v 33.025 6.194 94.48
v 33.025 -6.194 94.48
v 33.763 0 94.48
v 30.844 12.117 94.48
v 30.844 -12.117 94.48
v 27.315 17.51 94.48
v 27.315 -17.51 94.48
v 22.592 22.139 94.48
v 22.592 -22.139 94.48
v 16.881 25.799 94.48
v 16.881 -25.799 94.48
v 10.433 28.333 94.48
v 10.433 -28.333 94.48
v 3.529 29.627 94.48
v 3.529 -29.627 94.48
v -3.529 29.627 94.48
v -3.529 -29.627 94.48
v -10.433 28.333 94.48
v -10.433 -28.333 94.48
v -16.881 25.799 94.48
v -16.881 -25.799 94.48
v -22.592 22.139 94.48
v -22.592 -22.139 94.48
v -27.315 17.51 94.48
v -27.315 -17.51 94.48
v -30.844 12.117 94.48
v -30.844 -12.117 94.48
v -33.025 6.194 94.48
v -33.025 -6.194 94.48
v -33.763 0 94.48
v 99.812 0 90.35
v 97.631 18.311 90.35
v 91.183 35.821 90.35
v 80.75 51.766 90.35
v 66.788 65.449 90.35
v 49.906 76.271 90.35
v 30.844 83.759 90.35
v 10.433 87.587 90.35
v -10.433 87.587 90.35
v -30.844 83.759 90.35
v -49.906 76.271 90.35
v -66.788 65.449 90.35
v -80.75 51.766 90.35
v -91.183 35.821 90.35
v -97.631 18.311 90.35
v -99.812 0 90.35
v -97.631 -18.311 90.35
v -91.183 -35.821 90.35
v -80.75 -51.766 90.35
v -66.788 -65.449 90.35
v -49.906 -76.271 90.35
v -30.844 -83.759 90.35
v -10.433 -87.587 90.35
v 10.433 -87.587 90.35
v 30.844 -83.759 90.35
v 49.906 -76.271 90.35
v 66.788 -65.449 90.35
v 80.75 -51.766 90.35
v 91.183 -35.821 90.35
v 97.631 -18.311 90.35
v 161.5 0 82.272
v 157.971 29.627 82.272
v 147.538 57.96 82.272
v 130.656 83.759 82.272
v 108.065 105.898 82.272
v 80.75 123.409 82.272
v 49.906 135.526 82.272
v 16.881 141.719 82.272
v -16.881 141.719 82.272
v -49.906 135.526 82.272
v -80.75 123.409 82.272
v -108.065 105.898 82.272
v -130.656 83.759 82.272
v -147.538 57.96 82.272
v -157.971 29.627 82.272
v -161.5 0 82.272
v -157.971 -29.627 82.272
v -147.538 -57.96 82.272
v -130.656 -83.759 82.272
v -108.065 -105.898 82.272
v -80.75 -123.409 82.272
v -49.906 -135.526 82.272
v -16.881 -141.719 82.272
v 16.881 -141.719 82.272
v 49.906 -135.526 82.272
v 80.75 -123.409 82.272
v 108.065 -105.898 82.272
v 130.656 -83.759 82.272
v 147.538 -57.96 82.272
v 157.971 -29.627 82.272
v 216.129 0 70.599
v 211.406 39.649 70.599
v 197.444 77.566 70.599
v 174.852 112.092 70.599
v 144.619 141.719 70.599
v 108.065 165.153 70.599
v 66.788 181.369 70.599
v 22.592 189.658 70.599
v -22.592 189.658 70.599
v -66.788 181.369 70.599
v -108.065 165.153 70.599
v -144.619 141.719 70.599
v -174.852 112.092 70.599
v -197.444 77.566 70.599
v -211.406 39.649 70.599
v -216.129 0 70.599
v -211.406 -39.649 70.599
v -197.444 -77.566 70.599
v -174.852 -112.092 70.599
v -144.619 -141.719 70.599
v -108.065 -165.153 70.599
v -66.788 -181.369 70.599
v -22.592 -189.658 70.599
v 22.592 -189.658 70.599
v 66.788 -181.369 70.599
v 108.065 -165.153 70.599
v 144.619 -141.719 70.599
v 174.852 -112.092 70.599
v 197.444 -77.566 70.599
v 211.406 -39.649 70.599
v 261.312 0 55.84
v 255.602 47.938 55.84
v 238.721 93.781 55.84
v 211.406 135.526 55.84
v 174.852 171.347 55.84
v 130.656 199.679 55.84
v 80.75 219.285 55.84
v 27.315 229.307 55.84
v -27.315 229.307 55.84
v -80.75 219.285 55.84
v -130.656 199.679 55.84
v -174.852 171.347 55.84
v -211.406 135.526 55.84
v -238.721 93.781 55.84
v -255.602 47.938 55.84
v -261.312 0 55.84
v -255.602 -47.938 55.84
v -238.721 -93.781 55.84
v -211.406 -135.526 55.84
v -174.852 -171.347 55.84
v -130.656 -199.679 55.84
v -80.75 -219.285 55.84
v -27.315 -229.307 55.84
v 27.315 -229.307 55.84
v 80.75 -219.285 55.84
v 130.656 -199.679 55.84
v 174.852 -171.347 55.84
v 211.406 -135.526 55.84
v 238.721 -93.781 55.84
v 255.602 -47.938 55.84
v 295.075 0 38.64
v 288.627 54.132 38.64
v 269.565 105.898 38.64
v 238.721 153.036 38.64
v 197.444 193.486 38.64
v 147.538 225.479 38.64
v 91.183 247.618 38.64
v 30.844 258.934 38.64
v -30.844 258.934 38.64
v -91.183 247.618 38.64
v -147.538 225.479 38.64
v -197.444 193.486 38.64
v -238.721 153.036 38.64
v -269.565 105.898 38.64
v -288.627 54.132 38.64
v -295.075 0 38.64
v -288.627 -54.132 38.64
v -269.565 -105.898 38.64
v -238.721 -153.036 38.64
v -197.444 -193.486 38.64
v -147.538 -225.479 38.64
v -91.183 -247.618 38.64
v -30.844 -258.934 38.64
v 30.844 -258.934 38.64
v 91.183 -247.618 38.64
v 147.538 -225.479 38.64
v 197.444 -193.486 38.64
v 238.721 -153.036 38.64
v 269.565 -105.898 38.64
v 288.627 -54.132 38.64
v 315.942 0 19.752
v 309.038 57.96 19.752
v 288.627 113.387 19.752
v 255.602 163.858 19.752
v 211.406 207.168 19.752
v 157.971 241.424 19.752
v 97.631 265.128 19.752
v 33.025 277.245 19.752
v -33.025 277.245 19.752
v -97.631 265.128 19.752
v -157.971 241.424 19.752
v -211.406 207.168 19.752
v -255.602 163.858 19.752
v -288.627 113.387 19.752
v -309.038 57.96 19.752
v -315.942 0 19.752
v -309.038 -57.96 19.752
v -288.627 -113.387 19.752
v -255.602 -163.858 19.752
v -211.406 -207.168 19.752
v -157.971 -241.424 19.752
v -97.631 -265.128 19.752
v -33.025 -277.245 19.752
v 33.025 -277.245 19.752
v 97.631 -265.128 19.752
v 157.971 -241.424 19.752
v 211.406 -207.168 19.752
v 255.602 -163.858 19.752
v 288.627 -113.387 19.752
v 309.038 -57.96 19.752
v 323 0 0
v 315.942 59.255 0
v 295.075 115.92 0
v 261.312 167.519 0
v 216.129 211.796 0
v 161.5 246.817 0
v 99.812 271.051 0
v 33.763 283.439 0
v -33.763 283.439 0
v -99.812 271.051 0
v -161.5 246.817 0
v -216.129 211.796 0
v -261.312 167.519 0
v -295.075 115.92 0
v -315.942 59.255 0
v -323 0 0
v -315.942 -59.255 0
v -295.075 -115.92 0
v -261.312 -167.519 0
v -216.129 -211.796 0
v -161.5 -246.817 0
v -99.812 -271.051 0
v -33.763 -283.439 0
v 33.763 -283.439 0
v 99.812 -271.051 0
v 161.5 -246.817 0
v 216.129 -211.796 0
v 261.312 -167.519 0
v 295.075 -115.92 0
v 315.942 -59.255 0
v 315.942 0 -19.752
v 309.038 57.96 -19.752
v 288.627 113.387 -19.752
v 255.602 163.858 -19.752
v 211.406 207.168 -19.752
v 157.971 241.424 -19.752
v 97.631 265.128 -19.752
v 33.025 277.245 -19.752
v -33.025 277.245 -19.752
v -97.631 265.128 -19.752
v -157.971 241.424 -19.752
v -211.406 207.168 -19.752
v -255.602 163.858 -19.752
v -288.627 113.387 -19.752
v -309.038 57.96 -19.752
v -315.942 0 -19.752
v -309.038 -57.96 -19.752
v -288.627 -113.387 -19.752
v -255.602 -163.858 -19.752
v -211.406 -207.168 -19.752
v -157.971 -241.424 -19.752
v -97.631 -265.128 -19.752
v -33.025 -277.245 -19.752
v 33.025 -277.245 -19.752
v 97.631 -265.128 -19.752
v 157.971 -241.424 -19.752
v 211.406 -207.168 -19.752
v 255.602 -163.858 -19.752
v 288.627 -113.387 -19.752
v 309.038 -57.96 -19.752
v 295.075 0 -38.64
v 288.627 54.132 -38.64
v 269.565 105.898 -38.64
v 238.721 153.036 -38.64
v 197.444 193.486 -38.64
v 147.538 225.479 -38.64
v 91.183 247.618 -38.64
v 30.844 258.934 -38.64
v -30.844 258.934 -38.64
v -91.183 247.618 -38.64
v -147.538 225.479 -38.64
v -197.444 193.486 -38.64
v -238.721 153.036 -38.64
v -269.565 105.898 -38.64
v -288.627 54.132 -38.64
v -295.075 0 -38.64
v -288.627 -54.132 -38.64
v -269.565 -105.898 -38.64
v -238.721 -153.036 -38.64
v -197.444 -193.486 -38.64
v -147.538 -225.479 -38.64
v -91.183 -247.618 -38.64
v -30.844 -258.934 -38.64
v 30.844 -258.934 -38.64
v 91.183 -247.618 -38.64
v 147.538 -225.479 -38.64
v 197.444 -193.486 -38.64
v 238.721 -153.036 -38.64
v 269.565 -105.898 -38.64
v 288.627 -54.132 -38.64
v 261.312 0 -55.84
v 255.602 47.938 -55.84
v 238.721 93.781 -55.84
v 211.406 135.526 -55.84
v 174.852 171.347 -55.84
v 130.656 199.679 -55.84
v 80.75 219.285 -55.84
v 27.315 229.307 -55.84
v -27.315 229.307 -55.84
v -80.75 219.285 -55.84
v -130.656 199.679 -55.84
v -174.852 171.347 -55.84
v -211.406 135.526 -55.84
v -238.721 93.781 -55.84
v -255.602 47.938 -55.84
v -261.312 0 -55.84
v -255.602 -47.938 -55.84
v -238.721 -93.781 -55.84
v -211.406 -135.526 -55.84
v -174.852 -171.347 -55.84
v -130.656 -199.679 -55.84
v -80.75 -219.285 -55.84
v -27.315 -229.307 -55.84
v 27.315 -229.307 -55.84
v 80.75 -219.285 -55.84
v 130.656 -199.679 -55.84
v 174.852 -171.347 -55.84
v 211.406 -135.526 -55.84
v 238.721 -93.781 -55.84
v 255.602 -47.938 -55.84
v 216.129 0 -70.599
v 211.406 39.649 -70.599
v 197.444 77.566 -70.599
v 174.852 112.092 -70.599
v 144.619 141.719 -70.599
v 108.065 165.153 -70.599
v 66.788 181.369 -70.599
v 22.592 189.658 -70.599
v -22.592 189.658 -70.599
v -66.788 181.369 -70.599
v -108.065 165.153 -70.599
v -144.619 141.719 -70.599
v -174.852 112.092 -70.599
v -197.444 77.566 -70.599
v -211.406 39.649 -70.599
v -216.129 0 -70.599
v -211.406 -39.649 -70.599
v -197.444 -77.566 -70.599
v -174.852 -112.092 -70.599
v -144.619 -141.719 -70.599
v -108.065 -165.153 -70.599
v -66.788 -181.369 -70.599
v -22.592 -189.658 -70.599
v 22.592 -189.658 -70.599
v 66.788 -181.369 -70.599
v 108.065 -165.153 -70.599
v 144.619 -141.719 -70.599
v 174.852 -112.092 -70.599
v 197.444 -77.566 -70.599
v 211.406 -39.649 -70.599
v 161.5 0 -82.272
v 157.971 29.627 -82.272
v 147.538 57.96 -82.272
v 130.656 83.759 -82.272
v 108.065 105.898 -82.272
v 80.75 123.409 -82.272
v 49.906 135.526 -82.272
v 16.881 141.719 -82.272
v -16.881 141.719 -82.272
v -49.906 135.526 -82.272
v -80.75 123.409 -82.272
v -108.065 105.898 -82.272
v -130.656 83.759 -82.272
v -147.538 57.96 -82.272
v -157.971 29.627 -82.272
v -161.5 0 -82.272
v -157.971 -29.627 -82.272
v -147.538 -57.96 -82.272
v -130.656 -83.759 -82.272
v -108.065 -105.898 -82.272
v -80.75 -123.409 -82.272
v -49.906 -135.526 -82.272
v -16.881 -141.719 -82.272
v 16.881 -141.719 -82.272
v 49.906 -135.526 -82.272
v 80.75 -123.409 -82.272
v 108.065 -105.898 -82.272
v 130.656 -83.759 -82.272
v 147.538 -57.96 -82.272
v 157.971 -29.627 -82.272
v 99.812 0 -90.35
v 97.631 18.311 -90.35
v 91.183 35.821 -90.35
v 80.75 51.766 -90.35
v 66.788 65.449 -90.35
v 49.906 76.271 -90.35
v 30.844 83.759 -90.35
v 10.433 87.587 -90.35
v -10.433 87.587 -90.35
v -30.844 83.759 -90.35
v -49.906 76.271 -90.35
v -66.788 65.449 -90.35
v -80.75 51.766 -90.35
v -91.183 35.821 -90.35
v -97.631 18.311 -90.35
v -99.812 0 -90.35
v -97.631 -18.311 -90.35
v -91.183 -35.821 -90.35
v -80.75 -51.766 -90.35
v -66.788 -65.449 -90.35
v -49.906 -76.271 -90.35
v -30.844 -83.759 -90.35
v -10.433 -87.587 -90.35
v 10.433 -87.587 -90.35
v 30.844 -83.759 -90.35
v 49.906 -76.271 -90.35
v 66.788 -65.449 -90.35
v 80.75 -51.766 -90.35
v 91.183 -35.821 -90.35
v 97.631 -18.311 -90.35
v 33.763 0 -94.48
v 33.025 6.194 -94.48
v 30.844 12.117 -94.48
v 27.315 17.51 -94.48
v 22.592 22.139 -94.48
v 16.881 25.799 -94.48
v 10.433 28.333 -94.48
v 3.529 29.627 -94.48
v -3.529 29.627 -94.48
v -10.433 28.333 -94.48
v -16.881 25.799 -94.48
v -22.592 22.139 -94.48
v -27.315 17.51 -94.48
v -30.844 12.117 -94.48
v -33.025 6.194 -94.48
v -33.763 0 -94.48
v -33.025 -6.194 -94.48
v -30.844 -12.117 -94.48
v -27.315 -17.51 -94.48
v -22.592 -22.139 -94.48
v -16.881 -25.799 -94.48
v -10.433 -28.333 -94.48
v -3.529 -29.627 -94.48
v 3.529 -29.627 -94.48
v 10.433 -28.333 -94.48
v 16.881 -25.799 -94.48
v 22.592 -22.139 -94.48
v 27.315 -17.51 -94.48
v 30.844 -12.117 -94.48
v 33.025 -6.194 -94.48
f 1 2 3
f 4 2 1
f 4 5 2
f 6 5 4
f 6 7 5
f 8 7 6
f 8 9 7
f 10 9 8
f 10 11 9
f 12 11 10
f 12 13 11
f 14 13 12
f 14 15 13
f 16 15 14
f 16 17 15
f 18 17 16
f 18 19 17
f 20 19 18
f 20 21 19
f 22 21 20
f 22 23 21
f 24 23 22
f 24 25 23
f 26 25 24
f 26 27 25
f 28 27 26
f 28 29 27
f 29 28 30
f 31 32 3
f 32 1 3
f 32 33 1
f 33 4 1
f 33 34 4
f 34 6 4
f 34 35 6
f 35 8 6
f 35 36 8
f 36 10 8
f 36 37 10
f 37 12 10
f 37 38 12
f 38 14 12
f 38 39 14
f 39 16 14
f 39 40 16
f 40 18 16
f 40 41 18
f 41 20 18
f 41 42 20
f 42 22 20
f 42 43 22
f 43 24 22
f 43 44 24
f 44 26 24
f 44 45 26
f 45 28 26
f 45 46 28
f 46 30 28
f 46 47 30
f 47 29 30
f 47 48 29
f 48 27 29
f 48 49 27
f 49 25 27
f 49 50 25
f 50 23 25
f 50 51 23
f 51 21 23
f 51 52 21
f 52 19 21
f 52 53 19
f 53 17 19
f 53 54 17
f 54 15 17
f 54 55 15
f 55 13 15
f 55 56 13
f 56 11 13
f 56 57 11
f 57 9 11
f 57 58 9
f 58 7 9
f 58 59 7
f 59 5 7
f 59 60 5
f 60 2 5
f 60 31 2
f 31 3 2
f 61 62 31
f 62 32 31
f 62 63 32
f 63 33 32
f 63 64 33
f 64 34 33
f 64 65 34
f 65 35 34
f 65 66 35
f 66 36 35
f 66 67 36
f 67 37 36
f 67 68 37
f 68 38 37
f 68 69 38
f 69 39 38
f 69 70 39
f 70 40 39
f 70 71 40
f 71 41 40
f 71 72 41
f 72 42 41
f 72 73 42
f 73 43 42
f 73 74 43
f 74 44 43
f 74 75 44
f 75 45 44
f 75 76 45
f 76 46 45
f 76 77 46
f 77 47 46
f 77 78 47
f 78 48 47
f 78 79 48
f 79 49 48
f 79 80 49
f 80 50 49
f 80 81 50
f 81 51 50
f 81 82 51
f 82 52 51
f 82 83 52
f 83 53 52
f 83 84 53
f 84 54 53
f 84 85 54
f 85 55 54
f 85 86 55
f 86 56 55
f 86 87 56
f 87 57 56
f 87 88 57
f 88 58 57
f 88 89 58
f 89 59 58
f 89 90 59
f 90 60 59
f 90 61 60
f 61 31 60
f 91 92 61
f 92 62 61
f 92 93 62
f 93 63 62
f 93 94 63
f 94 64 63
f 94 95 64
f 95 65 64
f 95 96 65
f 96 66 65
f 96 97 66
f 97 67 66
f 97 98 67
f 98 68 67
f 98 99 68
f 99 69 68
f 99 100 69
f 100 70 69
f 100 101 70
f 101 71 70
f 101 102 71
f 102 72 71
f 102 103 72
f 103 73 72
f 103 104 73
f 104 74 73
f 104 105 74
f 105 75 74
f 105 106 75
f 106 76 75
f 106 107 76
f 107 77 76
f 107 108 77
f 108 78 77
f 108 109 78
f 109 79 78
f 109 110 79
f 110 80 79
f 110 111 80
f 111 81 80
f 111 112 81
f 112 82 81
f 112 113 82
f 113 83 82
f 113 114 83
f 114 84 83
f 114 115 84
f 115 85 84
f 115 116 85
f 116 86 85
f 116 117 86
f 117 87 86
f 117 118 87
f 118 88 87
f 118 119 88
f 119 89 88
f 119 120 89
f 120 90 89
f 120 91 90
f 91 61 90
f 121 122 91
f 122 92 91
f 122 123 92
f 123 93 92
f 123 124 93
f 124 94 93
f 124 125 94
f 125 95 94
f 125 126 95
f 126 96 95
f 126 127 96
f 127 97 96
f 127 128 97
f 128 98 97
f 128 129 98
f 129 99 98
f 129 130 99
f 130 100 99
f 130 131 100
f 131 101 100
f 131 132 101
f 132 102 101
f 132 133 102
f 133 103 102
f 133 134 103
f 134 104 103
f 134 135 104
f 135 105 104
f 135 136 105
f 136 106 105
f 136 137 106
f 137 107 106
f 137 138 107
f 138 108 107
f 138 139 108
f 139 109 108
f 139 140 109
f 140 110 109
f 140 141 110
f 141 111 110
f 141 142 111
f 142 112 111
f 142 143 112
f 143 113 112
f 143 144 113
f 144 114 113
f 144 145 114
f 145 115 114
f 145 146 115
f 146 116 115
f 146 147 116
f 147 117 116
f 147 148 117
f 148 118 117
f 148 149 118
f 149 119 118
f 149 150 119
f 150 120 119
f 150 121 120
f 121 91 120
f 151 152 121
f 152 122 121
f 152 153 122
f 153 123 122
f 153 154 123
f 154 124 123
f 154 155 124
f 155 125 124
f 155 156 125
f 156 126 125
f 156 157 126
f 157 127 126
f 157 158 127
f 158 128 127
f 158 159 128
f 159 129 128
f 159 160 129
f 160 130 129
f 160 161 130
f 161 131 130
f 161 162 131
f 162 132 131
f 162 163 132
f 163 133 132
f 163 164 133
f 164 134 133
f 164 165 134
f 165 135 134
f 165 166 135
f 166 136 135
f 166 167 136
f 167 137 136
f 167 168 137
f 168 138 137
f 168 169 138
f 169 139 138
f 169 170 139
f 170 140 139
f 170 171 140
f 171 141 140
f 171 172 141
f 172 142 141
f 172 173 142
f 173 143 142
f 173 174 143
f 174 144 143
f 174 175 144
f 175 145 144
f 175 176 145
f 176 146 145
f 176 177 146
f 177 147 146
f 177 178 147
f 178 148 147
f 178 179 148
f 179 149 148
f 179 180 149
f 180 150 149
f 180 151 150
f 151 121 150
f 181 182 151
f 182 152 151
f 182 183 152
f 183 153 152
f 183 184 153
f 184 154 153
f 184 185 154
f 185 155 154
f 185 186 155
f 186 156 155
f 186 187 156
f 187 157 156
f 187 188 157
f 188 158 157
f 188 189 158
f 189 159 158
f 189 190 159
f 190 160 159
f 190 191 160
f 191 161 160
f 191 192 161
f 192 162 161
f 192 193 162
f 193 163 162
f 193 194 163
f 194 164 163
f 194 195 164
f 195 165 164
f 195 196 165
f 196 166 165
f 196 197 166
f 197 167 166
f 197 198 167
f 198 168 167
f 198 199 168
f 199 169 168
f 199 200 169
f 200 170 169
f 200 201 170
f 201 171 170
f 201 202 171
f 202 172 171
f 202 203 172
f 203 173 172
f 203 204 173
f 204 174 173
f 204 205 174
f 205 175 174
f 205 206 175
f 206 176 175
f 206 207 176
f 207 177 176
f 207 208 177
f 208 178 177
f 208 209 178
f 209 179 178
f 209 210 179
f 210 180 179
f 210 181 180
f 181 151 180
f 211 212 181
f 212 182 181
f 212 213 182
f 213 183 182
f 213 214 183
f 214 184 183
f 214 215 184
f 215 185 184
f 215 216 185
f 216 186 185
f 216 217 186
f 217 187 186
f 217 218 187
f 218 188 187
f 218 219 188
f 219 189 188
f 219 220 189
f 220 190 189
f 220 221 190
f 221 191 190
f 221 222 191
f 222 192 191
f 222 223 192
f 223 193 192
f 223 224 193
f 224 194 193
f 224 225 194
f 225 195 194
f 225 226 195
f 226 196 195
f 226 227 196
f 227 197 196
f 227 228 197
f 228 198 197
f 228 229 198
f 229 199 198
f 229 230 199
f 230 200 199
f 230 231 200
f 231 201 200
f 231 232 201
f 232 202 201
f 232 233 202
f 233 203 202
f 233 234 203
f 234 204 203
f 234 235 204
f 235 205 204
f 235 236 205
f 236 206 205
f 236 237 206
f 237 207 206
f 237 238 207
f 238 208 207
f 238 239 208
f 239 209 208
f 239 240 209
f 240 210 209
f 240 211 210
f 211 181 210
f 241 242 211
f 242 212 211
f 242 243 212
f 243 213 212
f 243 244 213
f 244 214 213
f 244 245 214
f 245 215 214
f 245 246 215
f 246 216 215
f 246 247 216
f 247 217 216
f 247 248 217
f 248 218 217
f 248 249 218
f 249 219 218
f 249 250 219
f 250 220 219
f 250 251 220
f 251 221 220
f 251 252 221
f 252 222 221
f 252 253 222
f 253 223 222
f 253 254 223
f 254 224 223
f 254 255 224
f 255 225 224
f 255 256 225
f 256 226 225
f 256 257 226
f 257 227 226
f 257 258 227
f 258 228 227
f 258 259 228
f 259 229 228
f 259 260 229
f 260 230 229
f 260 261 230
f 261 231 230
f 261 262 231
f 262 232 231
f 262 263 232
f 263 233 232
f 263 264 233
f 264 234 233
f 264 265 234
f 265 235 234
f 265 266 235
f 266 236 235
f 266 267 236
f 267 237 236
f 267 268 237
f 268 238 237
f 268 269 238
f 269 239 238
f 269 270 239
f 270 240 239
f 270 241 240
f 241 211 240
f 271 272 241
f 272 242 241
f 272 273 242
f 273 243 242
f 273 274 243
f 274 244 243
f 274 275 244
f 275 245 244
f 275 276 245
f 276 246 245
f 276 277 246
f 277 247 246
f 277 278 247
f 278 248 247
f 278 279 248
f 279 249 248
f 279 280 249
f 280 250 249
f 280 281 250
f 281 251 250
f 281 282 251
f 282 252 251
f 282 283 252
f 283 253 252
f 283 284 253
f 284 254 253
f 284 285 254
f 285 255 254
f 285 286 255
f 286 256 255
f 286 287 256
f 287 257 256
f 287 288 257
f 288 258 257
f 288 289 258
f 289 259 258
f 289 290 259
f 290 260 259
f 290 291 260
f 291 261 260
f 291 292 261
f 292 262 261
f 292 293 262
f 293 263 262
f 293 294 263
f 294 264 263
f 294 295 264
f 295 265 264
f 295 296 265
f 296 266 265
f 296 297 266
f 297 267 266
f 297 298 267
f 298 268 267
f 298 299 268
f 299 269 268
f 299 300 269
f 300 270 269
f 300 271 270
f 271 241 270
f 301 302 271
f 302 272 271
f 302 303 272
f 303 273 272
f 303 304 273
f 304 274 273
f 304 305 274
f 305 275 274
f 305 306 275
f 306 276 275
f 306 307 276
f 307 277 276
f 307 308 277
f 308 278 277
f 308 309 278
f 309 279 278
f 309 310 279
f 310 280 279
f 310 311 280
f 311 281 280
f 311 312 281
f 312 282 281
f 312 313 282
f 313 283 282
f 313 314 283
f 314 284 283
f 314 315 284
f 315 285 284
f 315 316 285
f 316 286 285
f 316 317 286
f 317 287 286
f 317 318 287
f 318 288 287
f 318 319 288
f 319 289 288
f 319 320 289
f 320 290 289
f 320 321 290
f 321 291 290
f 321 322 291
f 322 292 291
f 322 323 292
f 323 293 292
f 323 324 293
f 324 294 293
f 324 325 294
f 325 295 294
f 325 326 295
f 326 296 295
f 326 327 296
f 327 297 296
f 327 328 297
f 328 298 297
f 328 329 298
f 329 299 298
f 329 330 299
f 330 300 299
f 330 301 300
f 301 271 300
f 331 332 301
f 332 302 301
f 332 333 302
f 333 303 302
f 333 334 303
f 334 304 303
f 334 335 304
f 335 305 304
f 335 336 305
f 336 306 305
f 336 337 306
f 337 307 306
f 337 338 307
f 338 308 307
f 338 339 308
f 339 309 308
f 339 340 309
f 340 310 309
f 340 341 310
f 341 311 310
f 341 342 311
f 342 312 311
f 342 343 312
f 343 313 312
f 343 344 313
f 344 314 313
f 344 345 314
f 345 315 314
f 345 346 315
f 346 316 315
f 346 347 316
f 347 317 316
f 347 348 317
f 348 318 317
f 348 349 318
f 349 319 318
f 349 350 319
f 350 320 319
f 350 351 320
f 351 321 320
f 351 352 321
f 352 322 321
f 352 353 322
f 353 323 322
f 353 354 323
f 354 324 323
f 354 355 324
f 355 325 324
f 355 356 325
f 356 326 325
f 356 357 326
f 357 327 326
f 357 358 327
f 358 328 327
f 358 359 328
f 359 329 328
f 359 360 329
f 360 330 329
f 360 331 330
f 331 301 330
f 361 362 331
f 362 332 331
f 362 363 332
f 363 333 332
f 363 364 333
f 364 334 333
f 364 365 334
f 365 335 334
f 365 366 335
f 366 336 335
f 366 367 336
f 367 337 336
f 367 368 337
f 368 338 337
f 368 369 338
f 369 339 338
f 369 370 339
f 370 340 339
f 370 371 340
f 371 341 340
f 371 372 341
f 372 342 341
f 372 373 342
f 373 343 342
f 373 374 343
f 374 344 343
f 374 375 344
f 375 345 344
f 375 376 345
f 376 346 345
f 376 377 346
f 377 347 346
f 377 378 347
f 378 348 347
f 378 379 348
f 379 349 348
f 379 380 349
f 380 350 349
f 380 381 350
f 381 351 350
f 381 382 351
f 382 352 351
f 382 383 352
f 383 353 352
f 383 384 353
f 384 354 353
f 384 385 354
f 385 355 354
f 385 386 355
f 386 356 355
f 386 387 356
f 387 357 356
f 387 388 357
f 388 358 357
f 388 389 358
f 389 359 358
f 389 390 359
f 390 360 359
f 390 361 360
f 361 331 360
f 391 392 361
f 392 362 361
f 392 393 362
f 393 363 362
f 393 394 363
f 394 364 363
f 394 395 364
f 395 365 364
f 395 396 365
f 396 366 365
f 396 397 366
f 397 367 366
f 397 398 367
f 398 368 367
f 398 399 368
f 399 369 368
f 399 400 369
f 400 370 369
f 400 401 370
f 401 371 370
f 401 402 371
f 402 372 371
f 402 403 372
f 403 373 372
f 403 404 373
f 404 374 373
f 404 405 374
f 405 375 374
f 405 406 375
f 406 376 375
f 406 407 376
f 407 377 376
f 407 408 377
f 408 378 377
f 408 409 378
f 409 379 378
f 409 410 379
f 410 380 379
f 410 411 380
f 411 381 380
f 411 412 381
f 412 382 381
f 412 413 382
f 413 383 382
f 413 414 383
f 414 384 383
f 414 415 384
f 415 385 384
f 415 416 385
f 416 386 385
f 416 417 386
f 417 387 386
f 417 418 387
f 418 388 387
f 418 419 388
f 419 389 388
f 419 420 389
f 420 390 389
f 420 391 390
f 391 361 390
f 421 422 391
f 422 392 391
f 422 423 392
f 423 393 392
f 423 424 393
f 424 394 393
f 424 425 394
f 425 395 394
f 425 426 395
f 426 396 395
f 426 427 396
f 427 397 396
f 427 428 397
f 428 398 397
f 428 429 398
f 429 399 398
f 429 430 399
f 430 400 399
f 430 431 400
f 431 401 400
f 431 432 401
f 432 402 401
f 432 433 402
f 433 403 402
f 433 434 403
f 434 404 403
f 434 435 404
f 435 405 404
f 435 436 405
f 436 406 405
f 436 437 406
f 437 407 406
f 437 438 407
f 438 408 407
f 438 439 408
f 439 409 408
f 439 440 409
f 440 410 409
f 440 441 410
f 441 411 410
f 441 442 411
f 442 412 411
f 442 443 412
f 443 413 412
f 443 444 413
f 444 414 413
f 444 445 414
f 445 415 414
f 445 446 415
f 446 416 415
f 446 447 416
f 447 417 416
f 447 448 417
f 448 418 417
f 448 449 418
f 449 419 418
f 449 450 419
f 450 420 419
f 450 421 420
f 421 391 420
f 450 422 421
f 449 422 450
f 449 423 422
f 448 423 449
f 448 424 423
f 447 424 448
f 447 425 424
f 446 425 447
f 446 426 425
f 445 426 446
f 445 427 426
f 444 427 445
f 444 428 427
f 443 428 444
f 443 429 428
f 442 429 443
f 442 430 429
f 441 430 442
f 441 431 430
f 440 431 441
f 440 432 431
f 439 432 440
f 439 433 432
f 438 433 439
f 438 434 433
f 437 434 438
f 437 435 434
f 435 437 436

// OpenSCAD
// Generated by SolidPython 1.0.1 on 2020-07-29 00:46:53


scale(v = [17, 15, 5]) {
	sphere(r = 19);
}
/***********************************************
*********      SolidPython code:      **********
************************************************
 
# import packages: SolidPython
from solid import *
from solid.utils import *
from itertools import chain, combinations, permutations


class Resize:

    def __init__(self, scad_file):
        self.scad_file = scad_file
        #self.scad_file = import_scad(scad_file)
        # cone/cylinder param:
        self.r1 = 0
        self.r2 = 0
        self.h = 0
        # rectangular prism param:
        self.w = 0
        self.l = 0
        # ellipse param:
        self.r = 0

    # import OpenScad code (file name corresponds to shape)


    # classify shape + parameters
    def assign(self, param1, param2, param3):
        if self.scad_file == 'cone.scad':
            self.r1 = param1
            self.r2 = param2
            self.h = param3
        elif self.scad_file == 'cylinder.scad':
            self.r1 = param1
            self.r2 = param2
            self.h = param3
        elif self.scad_file == 'rectangularPrism.scad':
            self.h = param1
            self.l = param2
            self.w = param3
        else:
            self.r = param1
            self.h = param2

    # resize parameters
    def iterate(self):
        x = range(3, 20, 2)
        i = 1
        if self.scad_file == 'cone.scad':
            tempList = list(permutations(x, 2))
            for temp in tempList:
                param1 = temp[0]
                param2 = temp[1]
                filepath = 'produced_scad_files/' + 'cone' + str(param1) + '_' + str(param2) + '_' + '.scad'
                scad_render_to_file(cylinder(h=param1, r1=param2, r2=0), filepath)

        elif self.scad_file == 'cylinder.scad':
            tempList = list(permutations(x, 3))
            for temp in tempList:
                param1 = temp[0]
                param2 = temp[1]
                filepath = 'produced_scad_files/' + 'cylinder' + str(param1) + '_' + str(param2) + '_' + '.scad'
                scad_render_to_file(cylinder(h=param1, r1=param2, r2=param2), filepath)

        elif self.scad_file == 'rectangularPrism.scad':
            tempList = list(permutations(x, 3))
            for temp in tempList:
                param1 = temp[0]
                param2 = temp[1]
                param3 = temp[2]
                filepath = 'produced_scad_files/' + 'rectangularPrism' + str(param1) + '_' + str(param2) + '_' + str(
                    param3) + '.scad'
                scad_render_to_file(cube(size=(param1, param2, param3)), filepath)

        elif self.scad_file == 'ellipse.scad':
            tempList = list(permutations(x, 4))
            for temp in tempList:
                param1 = temp[0]
                param2 = temp[1]
                param3 = temp[2]
                param4 = temp[3]
                filepath = 'produced_scad_files/' + 'ellipse' + str(param1) + '_' + str(param2) + '_' + str(param3) + '_' + str(param4) + '.scad'
                scad_render_to_file(scale([param1, param2, param3])(sphere(r=param4)), filepath)

    def render_to_scadfile(self):
        scad_render_to_file(scad, 'example.scad') 
 
************************************************/
